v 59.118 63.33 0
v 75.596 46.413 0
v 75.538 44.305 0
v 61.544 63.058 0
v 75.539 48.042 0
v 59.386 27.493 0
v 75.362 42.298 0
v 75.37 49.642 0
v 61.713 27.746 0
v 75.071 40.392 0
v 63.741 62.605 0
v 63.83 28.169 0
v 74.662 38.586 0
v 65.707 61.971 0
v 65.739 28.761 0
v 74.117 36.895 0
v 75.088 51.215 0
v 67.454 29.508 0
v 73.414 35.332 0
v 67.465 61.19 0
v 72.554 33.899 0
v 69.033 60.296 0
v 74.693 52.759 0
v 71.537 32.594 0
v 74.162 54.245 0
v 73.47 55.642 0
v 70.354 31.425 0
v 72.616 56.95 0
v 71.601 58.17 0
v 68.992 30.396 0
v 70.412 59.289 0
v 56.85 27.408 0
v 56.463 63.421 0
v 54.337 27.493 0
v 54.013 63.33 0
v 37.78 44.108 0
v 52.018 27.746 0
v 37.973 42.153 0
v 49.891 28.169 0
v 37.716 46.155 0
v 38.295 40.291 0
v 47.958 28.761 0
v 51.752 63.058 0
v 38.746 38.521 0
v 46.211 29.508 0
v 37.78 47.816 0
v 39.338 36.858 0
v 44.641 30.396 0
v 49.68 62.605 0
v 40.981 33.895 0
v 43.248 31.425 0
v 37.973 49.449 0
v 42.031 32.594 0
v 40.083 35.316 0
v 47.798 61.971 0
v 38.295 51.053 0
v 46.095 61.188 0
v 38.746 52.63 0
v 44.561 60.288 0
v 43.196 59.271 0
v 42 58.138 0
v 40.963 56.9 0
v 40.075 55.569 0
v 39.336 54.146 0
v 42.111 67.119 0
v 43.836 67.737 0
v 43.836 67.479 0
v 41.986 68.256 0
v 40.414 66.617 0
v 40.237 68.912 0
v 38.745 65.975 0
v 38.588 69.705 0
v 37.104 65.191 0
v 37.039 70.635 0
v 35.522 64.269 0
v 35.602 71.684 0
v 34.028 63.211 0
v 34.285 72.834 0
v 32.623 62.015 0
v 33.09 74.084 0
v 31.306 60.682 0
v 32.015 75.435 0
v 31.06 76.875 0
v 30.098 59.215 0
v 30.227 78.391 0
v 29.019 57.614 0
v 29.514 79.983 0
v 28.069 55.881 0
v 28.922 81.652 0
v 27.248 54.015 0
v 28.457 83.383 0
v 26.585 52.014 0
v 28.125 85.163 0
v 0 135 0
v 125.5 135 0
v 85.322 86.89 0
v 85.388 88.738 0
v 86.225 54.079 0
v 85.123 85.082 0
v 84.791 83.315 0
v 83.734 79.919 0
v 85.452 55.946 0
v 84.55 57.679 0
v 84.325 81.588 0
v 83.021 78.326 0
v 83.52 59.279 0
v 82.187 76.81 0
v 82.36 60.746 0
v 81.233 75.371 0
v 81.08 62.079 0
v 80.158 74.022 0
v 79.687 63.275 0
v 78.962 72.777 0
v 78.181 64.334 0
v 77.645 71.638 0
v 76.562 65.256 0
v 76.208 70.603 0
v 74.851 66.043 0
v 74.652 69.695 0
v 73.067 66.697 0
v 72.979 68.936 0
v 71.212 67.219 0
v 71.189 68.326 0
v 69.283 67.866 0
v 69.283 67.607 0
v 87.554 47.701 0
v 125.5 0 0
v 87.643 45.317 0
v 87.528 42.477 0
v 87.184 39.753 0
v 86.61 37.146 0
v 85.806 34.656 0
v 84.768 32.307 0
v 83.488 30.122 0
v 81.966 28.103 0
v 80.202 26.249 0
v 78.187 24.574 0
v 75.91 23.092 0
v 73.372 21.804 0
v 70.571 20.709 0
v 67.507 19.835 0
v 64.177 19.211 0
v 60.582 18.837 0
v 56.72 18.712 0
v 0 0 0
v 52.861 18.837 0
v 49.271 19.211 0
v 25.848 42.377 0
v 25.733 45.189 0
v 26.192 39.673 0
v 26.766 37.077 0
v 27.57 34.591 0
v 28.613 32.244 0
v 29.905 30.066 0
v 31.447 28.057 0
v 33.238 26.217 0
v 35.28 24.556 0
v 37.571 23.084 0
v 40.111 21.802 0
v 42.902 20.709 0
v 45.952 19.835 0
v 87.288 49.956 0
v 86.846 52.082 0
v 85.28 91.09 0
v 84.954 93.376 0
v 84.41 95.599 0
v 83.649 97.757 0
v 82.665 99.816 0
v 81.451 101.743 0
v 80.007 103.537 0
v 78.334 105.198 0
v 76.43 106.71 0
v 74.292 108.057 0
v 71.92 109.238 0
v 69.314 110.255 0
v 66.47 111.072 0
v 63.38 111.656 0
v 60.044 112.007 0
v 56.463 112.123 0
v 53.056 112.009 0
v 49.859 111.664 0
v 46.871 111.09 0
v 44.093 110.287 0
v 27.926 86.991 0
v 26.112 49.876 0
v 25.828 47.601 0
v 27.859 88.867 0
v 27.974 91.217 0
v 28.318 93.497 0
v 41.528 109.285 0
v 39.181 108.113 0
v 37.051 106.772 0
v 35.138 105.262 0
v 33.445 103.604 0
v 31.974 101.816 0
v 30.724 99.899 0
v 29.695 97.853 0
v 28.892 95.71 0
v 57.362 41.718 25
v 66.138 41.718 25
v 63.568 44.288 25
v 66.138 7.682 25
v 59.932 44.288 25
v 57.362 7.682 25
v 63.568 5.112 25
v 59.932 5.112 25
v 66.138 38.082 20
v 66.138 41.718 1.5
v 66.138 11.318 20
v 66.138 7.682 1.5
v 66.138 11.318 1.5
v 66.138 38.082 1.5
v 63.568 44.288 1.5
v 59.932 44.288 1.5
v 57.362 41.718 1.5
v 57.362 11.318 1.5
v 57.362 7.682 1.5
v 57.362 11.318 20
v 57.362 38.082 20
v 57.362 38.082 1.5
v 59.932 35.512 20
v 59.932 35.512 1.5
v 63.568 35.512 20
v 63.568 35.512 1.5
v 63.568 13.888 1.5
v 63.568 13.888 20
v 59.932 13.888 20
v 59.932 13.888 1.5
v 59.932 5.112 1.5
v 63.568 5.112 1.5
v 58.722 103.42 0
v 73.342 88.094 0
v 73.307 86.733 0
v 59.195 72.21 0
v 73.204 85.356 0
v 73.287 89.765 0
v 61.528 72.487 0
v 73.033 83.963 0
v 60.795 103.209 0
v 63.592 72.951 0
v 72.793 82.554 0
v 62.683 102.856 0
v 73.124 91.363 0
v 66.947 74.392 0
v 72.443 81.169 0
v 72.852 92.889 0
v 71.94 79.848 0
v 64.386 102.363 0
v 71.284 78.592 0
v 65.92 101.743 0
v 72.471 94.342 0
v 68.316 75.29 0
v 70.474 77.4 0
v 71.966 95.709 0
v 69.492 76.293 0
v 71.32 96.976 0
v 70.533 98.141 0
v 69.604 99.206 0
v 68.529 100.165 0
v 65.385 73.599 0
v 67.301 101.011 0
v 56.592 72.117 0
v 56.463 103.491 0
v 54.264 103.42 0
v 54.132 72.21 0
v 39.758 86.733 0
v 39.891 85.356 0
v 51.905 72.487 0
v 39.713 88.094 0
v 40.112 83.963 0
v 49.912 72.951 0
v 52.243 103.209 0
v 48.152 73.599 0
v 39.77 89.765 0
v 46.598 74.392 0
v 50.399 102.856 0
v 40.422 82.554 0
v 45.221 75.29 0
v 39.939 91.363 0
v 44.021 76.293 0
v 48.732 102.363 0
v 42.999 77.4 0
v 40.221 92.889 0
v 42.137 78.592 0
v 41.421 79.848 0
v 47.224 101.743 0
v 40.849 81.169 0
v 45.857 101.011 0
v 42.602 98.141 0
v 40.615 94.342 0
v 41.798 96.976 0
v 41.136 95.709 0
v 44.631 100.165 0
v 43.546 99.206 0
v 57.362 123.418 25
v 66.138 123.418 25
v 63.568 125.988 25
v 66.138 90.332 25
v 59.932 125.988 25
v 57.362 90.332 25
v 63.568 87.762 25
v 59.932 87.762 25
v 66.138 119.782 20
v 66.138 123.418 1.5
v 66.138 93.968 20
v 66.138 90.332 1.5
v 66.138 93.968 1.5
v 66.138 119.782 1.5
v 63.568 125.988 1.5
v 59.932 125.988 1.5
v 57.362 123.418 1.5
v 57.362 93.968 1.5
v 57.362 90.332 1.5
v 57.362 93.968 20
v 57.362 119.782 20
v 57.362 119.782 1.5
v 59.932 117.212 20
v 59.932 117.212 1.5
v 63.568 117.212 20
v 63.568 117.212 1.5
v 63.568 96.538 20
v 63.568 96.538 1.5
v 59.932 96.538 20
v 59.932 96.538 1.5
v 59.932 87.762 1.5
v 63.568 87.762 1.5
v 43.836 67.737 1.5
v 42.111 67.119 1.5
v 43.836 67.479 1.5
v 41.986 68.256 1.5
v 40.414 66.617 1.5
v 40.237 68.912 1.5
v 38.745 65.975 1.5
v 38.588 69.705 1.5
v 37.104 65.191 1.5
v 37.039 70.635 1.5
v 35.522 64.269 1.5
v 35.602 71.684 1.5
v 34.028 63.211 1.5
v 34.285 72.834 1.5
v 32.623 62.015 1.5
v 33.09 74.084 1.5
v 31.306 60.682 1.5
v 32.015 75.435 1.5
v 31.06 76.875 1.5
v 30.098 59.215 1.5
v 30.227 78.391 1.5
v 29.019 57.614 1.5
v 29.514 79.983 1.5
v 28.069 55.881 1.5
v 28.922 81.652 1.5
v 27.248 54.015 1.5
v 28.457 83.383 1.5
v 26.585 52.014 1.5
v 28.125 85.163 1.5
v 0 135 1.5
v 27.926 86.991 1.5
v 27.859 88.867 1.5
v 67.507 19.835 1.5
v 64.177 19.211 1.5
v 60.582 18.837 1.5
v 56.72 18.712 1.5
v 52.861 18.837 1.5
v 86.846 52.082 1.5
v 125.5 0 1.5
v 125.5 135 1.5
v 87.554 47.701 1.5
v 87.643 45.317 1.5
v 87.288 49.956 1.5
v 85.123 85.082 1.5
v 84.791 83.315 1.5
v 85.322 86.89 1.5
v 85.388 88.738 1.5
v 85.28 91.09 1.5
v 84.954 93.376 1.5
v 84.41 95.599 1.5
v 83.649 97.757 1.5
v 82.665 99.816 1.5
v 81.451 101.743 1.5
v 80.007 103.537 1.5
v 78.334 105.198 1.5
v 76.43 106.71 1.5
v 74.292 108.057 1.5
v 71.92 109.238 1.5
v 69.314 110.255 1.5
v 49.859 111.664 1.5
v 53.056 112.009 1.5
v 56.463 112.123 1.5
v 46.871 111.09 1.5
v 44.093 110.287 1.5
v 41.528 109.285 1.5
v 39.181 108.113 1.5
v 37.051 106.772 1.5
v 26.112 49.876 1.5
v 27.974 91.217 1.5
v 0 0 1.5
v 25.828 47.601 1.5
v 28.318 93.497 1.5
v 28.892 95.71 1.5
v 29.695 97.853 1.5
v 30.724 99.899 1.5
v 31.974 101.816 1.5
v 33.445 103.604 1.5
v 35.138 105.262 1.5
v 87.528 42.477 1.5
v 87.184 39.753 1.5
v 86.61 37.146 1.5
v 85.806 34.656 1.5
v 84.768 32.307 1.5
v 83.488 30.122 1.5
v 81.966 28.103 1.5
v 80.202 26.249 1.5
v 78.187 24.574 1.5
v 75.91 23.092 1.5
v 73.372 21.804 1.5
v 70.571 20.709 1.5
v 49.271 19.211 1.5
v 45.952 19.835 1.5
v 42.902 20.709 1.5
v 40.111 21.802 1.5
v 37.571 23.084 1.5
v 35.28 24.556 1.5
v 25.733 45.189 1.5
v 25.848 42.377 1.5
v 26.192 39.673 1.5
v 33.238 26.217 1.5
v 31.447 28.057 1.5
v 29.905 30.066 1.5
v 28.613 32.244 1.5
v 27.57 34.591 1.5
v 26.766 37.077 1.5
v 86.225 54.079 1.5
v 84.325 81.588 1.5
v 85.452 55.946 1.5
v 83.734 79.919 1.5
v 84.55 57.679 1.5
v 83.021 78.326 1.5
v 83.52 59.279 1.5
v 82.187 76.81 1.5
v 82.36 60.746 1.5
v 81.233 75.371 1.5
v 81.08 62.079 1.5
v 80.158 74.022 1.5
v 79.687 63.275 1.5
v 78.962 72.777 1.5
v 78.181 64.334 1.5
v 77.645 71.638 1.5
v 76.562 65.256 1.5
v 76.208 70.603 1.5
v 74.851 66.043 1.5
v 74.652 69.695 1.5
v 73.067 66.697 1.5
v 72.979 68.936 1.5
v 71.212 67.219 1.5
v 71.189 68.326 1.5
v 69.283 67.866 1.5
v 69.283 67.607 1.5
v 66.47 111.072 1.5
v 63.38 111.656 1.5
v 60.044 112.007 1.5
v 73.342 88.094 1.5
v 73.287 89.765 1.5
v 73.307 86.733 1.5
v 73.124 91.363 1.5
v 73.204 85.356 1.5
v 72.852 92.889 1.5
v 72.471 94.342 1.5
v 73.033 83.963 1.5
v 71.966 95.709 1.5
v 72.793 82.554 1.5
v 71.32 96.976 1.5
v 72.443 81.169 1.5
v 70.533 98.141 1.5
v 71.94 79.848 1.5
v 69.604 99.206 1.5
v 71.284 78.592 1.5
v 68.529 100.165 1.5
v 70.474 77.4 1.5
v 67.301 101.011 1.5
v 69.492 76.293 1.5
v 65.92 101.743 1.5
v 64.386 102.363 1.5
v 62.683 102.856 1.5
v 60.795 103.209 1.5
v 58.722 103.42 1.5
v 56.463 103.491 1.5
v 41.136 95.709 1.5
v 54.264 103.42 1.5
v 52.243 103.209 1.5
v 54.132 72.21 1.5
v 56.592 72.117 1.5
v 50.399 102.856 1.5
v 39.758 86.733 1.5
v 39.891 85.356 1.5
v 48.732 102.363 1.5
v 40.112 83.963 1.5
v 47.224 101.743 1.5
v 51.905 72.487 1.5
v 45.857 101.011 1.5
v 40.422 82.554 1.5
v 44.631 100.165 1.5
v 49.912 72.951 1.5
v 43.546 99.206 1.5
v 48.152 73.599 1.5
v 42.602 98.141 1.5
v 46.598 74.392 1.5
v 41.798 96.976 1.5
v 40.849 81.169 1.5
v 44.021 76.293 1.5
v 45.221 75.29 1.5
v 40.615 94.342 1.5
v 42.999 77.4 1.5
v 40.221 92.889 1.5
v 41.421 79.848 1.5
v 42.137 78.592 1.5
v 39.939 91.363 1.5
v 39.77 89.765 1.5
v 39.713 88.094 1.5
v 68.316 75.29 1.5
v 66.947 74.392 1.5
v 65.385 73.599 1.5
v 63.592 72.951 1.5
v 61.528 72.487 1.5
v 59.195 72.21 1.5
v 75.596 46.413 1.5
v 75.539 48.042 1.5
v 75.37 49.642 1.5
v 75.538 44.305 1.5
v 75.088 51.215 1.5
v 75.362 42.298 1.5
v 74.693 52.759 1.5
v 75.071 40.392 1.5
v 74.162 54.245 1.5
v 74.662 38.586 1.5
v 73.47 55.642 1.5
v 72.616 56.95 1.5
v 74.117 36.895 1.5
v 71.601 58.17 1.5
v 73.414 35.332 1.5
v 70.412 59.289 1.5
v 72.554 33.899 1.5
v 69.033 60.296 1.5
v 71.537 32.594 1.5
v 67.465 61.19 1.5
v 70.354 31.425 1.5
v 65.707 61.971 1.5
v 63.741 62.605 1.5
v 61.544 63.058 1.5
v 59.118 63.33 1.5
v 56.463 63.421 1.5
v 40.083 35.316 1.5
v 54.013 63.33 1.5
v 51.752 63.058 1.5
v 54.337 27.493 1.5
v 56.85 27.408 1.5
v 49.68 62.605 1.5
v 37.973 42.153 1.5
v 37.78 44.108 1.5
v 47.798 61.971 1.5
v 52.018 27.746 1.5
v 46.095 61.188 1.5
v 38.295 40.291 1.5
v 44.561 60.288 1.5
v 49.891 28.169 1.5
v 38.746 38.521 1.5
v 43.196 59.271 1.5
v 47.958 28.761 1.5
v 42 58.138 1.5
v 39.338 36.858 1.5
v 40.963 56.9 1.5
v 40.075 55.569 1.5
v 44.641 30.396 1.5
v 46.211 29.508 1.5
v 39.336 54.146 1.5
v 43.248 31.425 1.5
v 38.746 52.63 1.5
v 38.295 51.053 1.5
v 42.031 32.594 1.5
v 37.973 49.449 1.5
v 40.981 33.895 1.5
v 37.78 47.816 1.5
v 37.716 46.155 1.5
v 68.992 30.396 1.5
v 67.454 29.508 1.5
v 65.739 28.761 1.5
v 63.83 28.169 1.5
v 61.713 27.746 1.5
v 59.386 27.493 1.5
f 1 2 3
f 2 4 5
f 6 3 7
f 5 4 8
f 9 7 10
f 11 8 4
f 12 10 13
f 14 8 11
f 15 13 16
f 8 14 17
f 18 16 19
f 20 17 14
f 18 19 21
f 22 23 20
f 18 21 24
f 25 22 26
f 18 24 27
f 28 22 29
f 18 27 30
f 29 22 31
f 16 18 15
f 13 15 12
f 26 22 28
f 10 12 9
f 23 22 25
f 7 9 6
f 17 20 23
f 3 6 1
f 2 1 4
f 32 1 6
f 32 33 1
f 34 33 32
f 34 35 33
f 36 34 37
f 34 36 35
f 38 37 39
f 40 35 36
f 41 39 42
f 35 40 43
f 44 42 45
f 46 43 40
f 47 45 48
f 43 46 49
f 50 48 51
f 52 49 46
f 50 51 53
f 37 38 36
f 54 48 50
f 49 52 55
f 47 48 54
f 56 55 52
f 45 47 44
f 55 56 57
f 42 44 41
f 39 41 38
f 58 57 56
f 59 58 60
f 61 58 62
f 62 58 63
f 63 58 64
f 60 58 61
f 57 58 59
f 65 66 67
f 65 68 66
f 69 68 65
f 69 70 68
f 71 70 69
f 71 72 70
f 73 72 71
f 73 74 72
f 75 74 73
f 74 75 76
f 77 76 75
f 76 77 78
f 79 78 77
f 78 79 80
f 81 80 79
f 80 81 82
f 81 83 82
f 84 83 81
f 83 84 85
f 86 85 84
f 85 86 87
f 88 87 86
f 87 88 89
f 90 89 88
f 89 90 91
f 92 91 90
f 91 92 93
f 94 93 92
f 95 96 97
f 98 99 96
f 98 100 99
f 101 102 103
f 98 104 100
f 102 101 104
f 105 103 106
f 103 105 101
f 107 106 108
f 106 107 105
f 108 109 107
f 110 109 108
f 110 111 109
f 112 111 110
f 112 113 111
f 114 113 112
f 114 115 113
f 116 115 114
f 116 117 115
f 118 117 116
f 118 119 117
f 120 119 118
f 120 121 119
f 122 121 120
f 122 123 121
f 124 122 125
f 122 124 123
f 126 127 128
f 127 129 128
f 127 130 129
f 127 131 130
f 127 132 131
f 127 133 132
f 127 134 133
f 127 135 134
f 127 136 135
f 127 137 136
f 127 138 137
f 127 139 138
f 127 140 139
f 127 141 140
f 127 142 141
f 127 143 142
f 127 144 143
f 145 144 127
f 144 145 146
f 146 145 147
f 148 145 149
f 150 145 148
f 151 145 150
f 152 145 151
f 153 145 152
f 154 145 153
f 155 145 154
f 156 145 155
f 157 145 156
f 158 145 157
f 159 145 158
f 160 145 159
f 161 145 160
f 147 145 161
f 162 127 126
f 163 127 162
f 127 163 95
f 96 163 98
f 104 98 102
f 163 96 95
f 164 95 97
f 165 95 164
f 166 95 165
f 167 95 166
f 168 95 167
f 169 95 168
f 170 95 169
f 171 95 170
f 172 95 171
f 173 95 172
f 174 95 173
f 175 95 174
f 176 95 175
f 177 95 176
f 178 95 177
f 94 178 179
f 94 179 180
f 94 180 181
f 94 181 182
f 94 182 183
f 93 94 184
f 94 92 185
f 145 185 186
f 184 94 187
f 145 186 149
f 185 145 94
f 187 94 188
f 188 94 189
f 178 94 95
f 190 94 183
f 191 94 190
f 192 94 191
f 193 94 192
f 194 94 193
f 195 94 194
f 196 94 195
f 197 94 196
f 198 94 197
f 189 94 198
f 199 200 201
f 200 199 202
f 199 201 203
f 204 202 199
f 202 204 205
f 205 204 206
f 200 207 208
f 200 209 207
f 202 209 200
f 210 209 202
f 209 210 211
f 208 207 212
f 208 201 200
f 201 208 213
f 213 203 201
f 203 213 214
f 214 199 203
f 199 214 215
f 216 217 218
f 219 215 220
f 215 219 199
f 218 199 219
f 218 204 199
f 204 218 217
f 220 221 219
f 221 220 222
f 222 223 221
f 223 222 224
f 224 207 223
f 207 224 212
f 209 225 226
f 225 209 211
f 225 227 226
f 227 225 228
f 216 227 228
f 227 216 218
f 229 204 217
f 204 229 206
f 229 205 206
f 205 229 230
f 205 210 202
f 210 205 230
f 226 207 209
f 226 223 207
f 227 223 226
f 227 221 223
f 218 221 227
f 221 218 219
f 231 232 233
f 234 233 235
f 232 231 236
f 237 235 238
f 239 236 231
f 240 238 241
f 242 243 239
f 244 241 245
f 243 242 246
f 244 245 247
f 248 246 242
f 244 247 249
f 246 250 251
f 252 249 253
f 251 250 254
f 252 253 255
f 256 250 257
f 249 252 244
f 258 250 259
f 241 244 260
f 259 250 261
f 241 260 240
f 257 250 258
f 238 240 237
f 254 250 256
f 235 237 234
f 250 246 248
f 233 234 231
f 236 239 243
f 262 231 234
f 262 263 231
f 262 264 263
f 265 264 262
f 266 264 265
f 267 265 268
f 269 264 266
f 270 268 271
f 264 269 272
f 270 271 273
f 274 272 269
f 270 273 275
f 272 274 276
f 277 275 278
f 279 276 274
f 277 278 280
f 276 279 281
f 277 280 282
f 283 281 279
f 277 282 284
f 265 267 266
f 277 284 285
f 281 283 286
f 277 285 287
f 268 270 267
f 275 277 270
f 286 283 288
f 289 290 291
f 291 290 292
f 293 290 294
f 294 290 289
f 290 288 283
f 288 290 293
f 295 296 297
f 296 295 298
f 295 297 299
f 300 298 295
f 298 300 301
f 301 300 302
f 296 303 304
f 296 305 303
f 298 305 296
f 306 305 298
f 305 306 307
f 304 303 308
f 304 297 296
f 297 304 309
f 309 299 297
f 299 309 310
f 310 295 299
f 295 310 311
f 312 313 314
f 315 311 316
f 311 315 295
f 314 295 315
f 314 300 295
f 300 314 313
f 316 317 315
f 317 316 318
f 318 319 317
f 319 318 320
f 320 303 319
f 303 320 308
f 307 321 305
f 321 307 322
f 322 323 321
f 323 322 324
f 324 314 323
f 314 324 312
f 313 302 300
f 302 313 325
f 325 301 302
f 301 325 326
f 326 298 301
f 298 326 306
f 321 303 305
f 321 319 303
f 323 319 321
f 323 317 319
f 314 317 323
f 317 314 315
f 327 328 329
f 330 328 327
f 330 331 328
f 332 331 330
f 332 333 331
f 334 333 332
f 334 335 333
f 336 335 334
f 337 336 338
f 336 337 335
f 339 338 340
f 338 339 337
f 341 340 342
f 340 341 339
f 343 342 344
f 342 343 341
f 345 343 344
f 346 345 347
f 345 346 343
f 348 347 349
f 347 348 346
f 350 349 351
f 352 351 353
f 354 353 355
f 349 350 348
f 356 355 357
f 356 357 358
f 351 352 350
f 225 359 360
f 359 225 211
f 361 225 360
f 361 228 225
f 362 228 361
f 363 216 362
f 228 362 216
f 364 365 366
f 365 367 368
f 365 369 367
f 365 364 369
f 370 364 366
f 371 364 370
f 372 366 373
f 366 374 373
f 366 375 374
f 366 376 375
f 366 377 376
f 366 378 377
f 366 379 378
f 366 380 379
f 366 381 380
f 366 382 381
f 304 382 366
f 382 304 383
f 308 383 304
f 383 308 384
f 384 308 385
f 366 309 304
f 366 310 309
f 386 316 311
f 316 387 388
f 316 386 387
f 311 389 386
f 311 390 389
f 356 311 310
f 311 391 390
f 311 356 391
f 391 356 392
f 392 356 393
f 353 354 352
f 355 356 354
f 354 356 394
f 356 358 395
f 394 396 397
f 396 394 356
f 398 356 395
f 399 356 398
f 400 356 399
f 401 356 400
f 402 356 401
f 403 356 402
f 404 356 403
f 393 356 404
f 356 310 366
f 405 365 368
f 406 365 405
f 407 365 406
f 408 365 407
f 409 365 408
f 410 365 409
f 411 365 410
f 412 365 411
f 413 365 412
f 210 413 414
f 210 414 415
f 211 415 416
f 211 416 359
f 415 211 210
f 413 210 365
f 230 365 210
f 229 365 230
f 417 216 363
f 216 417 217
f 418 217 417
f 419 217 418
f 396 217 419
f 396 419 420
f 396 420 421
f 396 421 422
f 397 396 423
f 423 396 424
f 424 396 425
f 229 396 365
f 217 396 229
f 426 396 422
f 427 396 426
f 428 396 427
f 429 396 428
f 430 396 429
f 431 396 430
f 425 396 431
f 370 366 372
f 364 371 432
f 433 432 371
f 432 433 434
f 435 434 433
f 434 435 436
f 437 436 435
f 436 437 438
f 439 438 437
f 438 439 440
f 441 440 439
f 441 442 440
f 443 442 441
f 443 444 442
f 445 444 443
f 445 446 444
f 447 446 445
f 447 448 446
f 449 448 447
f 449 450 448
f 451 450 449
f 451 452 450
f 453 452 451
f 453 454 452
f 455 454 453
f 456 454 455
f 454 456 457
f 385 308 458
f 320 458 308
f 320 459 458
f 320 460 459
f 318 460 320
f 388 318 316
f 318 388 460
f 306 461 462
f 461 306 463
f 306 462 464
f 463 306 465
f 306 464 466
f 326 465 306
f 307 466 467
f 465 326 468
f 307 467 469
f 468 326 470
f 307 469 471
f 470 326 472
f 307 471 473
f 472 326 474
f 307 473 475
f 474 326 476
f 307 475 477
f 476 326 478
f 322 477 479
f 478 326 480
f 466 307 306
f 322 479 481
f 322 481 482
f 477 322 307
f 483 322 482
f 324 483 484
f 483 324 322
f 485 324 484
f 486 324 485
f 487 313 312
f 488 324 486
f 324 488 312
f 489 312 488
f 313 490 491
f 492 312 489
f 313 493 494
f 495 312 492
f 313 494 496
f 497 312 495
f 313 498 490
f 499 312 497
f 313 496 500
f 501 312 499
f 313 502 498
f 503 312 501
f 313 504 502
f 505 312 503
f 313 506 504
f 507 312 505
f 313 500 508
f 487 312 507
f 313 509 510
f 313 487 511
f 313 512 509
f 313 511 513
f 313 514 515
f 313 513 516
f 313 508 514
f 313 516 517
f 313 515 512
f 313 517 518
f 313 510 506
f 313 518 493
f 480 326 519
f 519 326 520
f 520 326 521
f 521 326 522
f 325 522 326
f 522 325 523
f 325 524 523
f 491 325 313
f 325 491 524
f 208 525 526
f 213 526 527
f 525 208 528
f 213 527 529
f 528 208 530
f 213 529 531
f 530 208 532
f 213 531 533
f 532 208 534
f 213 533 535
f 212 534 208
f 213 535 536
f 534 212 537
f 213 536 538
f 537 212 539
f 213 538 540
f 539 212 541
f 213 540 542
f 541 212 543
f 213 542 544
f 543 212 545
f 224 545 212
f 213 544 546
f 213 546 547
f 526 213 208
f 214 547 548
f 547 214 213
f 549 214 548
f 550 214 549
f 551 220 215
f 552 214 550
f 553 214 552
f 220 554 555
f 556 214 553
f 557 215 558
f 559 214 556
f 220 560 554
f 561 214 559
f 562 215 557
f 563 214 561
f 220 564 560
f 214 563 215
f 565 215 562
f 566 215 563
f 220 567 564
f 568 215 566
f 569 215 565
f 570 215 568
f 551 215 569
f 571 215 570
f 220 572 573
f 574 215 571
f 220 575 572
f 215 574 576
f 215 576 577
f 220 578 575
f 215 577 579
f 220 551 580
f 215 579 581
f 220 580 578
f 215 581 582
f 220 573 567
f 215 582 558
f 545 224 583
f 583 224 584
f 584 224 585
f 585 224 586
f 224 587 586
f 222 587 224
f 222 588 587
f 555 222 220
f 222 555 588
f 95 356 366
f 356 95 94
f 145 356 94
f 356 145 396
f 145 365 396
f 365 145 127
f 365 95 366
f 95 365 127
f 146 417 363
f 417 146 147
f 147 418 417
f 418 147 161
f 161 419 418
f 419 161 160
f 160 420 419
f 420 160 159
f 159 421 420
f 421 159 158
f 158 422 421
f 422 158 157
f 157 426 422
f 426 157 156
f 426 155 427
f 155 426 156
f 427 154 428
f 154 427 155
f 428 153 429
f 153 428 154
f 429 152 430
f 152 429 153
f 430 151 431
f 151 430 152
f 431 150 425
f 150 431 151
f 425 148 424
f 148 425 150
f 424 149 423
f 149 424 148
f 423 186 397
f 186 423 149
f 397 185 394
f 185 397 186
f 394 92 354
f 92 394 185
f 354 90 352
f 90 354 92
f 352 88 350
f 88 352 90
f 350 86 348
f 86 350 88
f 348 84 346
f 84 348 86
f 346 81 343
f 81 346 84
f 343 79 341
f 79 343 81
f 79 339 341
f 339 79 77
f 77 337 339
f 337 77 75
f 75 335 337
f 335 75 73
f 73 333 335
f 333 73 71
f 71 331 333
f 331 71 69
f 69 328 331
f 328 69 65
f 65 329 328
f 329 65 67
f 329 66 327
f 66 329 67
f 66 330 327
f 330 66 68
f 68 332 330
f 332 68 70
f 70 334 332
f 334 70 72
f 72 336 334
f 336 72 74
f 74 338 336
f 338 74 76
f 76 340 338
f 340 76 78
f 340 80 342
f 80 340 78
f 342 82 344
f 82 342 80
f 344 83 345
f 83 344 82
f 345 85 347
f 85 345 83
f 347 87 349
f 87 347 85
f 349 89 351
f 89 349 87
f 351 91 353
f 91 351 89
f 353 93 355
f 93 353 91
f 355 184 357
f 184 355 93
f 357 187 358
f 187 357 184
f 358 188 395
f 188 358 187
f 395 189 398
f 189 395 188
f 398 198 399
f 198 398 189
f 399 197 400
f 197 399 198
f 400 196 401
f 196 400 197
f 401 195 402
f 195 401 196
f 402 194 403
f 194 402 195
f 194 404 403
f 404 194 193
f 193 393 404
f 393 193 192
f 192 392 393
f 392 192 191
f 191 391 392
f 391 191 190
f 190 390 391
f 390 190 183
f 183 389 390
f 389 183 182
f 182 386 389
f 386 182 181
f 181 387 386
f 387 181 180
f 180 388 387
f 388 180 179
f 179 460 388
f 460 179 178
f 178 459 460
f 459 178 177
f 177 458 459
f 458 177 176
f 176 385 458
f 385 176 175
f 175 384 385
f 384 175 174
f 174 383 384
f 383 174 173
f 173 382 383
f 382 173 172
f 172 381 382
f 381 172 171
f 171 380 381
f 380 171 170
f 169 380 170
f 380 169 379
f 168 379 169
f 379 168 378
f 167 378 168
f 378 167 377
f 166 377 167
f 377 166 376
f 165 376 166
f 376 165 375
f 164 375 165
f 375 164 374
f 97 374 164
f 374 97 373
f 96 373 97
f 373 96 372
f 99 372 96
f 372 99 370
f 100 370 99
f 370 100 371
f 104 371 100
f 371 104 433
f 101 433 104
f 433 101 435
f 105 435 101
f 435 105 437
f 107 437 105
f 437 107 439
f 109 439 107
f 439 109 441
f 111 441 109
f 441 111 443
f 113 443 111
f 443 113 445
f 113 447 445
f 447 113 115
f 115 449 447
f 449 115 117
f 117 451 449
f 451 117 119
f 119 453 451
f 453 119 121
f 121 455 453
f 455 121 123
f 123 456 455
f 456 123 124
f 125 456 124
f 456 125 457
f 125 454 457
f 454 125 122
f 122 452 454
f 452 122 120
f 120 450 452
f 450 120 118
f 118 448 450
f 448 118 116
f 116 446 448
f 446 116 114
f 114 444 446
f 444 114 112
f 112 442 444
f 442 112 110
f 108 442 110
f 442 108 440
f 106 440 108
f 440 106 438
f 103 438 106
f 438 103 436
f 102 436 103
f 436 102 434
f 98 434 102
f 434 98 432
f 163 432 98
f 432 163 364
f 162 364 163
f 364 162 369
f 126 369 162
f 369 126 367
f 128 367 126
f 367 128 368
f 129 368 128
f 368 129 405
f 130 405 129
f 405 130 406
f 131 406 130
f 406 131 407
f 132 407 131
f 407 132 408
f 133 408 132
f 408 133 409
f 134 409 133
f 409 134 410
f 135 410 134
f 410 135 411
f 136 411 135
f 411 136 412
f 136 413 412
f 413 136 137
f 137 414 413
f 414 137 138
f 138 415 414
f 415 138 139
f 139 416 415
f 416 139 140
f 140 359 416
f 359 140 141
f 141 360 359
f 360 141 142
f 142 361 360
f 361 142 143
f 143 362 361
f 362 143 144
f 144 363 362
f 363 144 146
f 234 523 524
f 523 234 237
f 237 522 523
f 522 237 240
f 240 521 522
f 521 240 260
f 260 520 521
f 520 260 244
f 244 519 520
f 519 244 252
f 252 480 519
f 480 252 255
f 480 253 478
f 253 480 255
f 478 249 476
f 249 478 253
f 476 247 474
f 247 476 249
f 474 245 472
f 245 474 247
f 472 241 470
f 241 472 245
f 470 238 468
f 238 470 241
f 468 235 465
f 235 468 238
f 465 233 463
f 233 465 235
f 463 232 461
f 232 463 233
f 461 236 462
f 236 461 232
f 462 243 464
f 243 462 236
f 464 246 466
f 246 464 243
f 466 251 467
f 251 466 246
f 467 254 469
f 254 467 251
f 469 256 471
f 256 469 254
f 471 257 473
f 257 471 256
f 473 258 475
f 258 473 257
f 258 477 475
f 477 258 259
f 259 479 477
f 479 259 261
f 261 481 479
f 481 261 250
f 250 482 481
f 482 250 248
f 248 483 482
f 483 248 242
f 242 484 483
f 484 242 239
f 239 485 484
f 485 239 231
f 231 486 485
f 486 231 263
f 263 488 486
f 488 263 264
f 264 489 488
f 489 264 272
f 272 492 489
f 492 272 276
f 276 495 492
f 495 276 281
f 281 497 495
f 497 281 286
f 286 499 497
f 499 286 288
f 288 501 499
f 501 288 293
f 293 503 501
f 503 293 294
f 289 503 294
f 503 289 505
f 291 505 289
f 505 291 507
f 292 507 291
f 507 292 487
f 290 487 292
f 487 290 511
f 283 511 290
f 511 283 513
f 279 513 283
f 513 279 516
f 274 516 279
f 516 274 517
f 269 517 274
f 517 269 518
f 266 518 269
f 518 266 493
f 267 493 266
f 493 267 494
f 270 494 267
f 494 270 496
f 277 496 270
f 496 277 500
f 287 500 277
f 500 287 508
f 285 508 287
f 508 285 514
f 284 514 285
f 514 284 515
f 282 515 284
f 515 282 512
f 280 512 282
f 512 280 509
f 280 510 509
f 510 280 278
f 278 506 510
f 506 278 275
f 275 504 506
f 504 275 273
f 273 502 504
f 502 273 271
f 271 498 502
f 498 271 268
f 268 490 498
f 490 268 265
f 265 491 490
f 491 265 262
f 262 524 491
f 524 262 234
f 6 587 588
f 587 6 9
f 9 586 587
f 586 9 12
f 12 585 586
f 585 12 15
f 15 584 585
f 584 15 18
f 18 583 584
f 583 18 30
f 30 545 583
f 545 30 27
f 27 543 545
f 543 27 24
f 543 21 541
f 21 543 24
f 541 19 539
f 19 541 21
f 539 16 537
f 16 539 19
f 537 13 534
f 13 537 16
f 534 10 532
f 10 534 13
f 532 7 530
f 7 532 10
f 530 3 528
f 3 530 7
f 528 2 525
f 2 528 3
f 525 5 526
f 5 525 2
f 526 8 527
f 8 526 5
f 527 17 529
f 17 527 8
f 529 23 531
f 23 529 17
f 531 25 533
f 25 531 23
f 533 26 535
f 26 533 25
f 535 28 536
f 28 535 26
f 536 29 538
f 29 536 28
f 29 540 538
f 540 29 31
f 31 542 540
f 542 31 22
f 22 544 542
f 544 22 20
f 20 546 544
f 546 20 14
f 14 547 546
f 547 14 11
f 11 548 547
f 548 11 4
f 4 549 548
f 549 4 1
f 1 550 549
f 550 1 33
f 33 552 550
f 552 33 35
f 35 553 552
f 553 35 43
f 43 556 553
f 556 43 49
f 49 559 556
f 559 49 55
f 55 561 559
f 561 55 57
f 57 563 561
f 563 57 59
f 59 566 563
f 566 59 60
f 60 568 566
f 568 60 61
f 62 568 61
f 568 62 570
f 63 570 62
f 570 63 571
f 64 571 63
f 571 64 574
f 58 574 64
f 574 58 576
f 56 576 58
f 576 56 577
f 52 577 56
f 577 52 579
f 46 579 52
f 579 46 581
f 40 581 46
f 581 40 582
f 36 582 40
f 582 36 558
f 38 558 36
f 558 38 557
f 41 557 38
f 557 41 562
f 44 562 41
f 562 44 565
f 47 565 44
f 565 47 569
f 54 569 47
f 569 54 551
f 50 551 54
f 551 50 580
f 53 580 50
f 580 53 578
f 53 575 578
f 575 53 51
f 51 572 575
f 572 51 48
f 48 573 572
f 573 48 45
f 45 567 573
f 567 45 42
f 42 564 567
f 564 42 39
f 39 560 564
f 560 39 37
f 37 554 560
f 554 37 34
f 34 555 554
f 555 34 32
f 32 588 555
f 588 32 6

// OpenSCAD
digit = "8";
size = 95;
stencilThickness = 1.5;
handleHeight = 20;
handleThickness = 5;

module handle(p1,p2,r=10,height=20,thickness=5,sides=8) {
    angle = atan2(p2[1]-p1[1],p2[0]-p1[0]) + 180/sides;
    module base() {
        translate(p1) rotate(angle) circle(r=r,$fn=sides);
        translate(p2) rotate(angle) circle(r=r,$fn=sides);
    }
    linear_extrude(height=height+thickness) base();
    translate([0,0,height])
    linear_extrude(height=thickness) hull() base();
}

module digit(d,size=100,thickness=1.5,handleHeight=20,handleThickness=4, margin=20) {
    
    translate([margin,margin])
    linear_extrude(height=thickness)
    difference() {
        translate([-margin,-margin]) square([size*.9+2*margin,2*margin+size]);
        text(d,font="Arial:style=black",size=size);
    }
    function s(x) = x/100*size;
    if (d=="0") {
        handle([s(18),s(70)],[s(60),s(70)],s(5),height=handleHeight,thickness=handleThickness);
    }
    else if (d=="4") {
        handle([s(40),s(95)],[s(62),s(68)],s(5),height=handleHeight,thickness=handleThickness);
    }
    else if (d=="6") {
        handle([s(68),s(43)],[s(68),s(11)],s(5),height=handleHeight,thickness=handleThickness);
    }
    else if (d=="8") {
        handle([s(65),s(42)],[s(65),s(10)],s(5),height=handleHeight,thickness=handleThickness);
        handle([s(65),s(97)],[s(65),s(128)],s(5),height=handleHeight,thickness=handleThickness);
    }
    else if (d=="9") {
        handle([s(65),s(97)],[s(65),s(128)],s(5),height=handleHeight,thickness=handleThickness);
    }
}

digit(digit,size=size,thickness=stencilThickness,handleHeight=handleHeight,handleThickness=handleThickness);
